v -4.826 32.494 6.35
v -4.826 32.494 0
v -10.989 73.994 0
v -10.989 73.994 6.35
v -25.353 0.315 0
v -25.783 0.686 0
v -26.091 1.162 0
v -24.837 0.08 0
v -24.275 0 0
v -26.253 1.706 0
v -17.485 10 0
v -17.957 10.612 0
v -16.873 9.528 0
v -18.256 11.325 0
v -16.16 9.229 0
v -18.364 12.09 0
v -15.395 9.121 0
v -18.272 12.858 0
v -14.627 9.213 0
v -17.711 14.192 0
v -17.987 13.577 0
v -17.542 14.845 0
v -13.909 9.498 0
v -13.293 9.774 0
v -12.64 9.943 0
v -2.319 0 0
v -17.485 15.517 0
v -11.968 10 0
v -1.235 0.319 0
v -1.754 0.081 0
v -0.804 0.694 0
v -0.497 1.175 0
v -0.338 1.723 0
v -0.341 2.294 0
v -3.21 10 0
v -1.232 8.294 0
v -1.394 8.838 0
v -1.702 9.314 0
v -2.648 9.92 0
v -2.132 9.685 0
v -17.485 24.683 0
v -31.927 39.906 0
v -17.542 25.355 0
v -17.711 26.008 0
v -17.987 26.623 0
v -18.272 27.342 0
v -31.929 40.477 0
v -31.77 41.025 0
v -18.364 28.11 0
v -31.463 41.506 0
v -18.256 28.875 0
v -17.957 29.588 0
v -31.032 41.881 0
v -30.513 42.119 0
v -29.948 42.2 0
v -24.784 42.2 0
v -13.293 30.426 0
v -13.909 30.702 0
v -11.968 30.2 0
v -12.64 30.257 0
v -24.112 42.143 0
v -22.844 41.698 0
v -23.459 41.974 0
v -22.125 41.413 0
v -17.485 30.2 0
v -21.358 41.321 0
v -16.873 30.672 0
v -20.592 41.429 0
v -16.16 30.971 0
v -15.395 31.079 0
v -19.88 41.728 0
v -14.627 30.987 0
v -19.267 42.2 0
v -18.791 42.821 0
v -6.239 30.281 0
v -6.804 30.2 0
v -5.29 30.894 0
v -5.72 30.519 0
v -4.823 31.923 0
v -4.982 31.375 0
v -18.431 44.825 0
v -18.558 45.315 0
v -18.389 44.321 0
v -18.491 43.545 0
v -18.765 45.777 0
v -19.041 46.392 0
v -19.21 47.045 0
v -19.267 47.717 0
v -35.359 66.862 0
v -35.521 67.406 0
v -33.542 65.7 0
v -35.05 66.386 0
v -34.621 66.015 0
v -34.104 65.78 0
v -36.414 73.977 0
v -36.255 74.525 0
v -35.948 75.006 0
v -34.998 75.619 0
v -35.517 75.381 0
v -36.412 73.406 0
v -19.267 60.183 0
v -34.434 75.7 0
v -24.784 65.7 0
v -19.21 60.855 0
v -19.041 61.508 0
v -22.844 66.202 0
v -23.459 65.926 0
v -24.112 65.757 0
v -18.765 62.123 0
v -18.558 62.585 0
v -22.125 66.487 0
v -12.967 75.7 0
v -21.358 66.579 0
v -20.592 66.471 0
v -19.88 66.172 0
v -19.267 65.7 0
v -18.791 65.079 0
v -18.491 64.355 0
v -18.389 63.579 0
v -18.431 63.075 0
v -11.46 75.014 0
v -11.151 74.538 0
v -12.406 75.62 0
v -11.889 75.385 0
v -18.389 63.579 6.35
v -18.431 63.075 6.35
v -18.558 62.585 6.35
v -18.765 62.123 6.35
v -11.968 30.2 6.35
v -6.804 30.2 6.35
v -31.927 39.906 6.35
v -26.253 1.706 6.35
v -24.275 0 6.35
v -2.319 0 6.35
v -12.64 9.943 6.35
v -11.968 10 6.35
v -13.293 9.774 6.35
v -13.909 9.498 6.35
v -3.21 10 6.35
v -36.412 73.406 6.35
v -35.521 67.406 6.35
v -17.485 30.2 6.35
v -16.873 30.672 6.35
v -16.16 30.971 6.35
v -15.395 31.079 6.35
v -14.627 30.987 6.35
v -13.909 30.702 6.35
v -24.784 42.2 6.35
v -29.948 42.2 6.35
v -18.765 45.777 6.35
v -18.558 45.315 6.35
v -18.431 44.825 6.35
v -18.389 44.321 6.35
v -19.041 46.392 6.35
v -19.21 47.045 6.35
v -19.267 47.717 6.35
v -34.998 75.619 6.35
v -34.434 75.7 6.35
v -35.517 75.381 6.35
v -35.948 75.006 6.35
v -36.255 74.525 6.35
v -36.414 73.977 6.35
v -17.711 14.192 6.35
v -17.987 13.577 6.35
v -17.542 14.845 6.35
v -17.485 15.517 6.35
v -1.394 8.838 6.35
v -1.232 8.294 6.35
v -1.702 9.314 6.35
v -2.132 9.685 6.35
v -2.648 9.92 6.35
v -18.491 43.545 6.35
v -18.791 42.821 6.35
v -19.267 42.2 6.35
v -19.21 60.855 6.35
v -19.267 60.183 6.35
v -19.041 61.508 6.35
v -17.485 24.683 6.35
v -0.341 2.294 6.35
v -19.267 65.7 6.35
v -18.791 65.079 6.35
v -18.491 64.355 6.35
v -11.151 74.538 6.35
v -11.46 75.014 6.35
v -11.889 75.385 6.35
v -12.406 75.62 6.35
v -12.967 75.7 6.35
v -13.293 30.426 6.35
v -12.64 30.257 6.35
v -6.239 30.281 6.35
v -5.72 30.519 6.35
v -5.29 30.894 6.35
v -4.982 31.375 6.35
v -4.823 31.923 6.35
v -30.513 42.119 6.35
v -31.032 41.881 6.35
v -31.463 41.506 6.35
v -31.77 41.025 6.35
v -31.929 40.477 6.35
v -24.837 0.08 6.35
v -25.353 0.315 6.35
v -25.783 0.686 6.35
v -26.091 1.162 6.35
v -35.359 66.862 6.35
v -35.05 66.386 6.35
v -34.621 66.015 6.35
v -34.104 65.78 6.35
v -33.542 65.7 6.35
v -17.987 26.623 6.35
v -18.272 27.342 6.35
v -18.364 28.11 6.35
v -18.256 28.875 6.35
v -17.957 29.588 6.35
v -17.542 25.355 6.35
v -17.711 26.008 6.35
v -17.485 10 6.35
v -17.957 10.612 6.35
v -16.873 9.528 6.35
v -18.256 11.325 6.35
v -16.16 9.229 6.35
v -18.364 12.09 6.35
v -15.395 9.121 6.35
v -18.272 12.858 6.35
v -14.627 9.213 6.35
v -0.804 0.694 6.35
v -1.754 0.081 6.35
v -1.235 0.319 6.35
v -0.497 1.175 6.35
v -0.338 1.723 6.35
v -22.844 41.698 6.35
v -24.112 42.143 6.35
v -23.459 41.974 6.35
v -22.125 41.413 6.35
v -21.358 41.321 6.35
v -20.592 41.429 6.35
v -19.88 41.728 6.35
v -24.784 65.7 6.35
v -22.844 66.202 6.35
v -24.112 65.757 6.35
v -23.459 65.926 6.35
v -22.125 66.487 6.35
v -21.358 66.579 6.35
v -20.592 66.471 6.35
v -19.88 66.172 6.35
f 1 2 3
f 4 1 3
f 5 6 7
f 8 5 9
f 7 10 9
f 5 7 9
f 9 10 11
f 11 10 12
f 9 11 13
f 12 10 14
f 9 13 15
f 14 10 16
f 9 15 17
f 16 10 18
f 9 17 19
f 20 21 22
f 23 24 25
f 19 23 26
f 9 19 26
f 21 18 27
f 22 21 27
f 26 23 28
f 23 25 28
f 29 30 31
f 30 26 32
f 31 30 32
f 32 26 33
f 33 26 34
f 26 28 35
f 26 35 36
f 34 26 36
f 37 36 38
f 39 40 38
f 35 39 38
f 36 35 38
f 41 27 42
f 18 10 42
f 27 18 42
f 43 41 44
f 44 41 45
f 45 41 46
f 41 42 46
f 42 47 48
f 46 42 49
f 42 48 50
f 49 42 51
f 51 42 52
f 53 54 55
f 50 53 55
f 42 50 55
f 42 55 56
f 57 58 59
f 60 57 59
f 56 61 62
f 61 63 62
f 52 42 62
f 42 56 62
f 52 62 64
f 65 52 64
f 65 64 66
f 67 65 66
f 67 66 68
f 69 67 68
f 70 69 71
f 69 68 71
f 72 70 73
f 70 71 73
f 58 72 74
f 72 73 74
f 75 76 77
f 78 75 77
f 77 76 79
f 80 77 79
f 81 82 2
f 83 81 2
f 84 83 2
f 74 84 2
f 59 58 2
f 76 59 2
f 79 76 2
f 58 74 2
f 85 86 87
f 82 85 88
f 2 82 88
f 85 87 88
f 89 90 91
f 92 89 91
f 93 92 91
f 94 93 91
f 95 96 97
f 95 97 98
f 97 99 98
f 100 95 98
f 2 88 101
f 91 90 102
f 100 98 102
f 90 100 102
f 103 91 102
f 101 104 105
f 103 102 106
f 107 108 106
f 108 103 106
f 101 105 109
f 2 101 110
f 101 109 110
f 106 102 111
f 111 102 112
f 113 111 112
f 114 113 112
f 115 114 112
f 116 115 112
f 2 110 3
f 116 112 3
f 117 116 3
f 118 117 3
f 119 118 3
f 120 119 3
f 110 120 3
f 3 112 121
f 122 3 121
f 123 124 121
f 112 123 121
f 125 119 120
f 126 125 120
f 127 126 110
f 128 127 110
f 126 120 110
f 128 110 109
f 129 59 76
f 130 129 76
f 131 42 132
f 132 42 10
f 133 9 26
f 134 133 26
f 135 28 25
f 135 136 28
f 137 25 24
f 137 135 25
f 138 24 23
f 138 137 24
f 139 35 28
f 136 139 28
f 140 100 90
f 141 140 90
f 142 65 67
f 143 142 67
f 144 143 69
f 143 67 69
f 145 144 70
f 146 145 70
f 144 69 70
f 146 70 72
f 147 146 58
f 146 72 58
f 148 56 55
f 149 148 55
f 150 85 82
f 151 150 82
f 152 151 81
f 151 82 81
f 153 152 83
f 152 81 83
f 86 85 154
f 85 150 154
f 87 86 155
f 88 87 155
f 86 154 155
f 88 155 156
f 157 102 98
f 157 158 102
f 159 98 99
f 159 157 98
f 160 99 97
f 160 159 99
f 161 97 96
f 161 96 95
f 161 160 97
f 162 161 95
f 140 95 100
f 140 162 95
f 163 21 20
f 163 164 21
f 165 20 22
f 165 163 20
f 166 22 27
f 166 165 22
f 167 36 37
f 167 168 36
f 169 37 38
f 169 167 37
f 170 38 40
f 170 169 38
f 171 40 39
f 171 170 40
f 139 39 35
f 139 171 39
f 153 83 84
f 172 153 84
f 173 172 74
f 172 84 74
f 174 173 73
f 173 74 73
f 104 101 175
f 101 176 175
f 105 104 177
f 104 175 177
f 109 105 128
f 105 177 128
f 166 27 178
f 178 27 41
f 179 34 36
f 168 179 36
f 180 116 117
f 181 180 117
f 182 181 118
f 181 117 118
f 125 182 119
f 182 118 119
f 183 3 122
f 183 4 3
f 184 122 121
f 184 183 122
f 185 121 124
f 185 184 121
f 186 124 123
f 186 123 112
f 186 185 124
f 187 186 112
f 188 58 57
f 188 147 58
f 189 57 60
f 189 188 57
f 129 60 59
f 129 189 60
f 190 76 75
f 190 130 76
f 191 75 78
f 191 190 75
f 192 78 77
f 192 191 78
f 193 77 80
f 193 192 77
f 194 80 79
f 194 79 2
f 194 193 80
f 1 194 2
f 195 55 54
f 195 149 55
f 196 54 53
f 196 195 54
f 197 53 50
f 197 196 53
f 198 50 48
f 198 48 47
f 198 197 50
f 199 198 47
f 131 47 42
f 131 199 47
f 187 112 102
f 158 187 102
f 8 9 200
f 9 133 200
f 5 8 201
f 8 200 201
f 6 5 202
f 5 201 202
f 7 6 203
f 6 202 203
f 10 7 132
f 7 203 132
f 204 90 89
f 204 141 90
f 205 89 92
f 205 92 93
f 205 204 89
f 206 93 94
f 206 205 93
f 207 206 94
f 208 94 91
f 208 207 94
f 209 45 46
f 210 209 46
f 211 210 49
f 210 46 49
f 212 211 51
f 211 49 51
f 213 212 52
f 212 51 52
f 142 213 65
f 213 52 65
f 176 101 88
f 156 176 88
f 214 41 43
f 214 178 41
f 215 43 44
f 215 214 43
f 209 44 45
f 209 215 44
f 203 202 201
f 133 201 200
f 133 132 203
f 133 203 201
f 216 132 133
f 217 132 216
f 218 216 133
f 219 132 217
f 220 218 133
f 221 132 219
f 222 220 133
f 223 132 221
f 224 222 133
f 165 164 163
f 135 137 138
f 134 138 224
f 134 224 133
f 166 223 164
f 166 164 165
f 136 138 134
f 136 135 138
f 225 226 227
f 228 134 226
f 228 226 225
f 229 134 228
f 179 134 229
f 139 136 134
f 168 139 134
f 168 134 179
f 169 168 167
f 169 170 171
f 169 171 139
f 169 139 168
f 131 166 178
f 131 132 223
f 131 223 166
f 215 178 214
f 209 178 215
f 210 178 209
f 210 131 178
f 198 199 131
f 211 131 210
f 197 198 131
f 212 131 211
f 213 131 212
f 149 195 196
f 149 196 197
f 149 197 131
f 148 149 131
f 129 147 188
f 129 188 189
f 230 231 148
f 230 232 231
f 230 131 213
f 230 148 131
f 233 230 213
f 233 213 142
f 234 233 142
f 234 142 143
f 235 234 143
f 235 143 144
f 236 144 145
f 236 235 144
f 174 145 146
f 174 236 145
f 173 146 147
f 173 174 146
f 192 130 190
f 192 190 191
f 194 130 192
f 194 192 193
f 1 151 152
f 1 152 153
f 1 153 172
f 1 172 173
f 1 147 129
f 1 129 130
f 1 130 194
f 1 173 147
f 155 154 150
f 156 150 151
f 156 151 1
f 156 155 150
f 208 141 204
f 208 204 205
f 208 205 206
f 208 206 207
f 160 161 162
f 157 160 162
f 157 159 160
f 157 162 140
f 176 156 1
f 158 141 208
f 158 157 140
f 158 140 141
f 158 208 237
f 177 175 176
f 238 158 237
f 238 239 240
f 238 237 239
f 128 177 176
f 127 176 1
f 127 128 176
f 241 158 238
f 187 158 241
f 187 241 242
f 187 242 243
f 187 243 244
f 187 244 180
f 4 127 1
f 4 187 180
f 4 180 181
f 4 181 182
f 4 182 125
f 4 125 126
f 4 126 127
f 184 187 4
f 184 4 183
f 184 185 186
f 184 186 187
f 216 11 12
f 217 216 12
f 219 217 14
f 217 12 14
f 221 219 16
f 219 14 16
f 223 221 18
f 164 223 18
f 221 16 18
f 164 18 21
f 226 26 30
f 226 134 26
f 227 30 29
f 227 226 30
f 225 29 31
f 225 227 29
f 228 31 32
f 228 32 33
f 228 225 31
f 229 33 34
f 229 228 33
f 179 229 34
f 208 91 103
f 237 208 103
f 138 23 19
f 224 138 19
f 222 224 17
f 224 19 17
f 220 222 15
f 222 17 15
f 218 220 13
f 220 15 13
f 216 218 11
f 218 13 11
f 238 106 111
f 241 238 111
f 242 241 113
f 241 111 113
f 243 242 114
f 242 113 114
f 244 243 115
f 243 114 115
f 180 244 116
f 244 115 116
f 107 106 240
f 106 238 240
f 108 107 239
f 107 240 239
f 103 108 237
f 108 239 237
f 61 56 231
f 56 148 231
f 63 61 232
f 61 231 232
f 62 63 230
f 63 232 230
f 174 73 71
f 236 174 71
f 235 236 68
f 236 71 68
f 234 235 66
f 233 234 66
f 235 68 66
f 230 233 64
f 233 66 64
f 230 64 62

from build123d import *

# Parameters (mm, degrees)
F1_DEPTH = 6.35
F2_R     = 2
F3_R     = 4


with BuildPart() as f1:
    # F0 (on Top) → F1 (new body)
    with BuildSketch(Plane.XY):
        with BuildLine():
            Line((-26, 0), (0, 0))
            Line((0, 0), (-1.4851485149, 10))
            Line((-1.4851485149, 10), (-13.2425078277, 10))
            ThreePointArc((-13.2425078277, 10), (-15.3638281713, 9.1213203436), (-17.4851485149, 10))
            ThreePointArc((-17.4851485149, 10), (-18.3638281713, 12.1213203436), (-17.4851485149, 14.2426406871))
            Line((-17.4851485149, 14.2426406871), (-17.4851485149, 25.9573593129))
            ThreePointArc((-17.4851485149, 25.9573593129), (-18.3638281713, 28.0786796564), (-17.4851485149, 30.2))
            ThreePointArc((-17.4851485149, 30.2), (-15.3638281713, 31.0786796564), (-13.2425078277, 30.2))
            Line((-13.2425078277, 30.2), (-4.4851485149, 30.2))
            Line((-4.4851485149, 30.2), (-11.2425742574, 75.7))
            Line((-11.2425742574, 75.7), (-36.7524752475, 75.7))
            Line((-36.7524752475, 75.7), (-35.2673267327, 65.7))
            Line((-35.2673267327, 65.7), (-23.5099674198, 65.7))
            ThreePointArc((-23.5099674198, 65.7), (-21.3886470762, 66.5786796564), (-19.2673267327, 65.7))
            ThreePointArc((-19.2673267327, 65.7), (-18.6170084787, 64.7267299535), (-18.3886470762, 63.5786796564))
            ThreePointArc((-18.3886470762, 63.5786796564), (-18.6170084787, 62.4306293593), (-19.2673267327, 61.4573593129))
            Line((-19.2673267327, 61.4573593129), (-19.2673267327, 46.4426406871))
            ThreePointArc((-19.2673267327, 46.4426406871), (-18.6170084787, 45.4693706407), (-18.3886470762, 44.3213203436))
            ThreePointArc((-18.3886470762, 44.3213203436), (-18.6170084787, 43.1732700465), (-19.2673267327, 42.2))
            ThreePointArc((-19.2673267327, 42.2), (-21.3886470762, 41.3213203436), (-23.5099674198, 42.2))
            Line((-23.5099674198, 42.2), (-32.2673267327, 42.2))
            Line((-32.2673267327, 42.2), (-26, 0))
        make_face()
    extrude(amount=F1_DEPTH)

    # F2
    f2_edges = [f1.edges().sort_by_distance(p)[0] for p in [
        (-4.485149, 30.2, 3.175),
        (-36.752475, 75.7, 3.175),
        (-35.267327, 65.7, 3.175),
        (-32.267327, 42.2, 3.175),
        (-11.242574, 75.7, 3.175),
        (-1.485149, 10, 3.175),
        (0, 0, 3.175),
        (-26, 0, 3.175),
    ]]
    fillet(f2_edges, radius=F2_R)

    # F3
    f3_edges = [f1.edges().sort_by_distance(p)[0] for p in [
        (-23.509967, 65.7, 3.175),
        (-19.267327, 61.457359, 3.175),
        (-19.267327, 46.442641, 3.175),
        (-23.509967, 42.2, 3.175),
        (-13.242508, 30.2, 3.175),
        (-17.485149, 25.957359, 3.175),
        (-17.485149, 14.242641, 3.175),
        (-13.242508, 10, 3.175),
    ]]
    fillet(f3_edges, radius=F3_R)


solid = f1.part
